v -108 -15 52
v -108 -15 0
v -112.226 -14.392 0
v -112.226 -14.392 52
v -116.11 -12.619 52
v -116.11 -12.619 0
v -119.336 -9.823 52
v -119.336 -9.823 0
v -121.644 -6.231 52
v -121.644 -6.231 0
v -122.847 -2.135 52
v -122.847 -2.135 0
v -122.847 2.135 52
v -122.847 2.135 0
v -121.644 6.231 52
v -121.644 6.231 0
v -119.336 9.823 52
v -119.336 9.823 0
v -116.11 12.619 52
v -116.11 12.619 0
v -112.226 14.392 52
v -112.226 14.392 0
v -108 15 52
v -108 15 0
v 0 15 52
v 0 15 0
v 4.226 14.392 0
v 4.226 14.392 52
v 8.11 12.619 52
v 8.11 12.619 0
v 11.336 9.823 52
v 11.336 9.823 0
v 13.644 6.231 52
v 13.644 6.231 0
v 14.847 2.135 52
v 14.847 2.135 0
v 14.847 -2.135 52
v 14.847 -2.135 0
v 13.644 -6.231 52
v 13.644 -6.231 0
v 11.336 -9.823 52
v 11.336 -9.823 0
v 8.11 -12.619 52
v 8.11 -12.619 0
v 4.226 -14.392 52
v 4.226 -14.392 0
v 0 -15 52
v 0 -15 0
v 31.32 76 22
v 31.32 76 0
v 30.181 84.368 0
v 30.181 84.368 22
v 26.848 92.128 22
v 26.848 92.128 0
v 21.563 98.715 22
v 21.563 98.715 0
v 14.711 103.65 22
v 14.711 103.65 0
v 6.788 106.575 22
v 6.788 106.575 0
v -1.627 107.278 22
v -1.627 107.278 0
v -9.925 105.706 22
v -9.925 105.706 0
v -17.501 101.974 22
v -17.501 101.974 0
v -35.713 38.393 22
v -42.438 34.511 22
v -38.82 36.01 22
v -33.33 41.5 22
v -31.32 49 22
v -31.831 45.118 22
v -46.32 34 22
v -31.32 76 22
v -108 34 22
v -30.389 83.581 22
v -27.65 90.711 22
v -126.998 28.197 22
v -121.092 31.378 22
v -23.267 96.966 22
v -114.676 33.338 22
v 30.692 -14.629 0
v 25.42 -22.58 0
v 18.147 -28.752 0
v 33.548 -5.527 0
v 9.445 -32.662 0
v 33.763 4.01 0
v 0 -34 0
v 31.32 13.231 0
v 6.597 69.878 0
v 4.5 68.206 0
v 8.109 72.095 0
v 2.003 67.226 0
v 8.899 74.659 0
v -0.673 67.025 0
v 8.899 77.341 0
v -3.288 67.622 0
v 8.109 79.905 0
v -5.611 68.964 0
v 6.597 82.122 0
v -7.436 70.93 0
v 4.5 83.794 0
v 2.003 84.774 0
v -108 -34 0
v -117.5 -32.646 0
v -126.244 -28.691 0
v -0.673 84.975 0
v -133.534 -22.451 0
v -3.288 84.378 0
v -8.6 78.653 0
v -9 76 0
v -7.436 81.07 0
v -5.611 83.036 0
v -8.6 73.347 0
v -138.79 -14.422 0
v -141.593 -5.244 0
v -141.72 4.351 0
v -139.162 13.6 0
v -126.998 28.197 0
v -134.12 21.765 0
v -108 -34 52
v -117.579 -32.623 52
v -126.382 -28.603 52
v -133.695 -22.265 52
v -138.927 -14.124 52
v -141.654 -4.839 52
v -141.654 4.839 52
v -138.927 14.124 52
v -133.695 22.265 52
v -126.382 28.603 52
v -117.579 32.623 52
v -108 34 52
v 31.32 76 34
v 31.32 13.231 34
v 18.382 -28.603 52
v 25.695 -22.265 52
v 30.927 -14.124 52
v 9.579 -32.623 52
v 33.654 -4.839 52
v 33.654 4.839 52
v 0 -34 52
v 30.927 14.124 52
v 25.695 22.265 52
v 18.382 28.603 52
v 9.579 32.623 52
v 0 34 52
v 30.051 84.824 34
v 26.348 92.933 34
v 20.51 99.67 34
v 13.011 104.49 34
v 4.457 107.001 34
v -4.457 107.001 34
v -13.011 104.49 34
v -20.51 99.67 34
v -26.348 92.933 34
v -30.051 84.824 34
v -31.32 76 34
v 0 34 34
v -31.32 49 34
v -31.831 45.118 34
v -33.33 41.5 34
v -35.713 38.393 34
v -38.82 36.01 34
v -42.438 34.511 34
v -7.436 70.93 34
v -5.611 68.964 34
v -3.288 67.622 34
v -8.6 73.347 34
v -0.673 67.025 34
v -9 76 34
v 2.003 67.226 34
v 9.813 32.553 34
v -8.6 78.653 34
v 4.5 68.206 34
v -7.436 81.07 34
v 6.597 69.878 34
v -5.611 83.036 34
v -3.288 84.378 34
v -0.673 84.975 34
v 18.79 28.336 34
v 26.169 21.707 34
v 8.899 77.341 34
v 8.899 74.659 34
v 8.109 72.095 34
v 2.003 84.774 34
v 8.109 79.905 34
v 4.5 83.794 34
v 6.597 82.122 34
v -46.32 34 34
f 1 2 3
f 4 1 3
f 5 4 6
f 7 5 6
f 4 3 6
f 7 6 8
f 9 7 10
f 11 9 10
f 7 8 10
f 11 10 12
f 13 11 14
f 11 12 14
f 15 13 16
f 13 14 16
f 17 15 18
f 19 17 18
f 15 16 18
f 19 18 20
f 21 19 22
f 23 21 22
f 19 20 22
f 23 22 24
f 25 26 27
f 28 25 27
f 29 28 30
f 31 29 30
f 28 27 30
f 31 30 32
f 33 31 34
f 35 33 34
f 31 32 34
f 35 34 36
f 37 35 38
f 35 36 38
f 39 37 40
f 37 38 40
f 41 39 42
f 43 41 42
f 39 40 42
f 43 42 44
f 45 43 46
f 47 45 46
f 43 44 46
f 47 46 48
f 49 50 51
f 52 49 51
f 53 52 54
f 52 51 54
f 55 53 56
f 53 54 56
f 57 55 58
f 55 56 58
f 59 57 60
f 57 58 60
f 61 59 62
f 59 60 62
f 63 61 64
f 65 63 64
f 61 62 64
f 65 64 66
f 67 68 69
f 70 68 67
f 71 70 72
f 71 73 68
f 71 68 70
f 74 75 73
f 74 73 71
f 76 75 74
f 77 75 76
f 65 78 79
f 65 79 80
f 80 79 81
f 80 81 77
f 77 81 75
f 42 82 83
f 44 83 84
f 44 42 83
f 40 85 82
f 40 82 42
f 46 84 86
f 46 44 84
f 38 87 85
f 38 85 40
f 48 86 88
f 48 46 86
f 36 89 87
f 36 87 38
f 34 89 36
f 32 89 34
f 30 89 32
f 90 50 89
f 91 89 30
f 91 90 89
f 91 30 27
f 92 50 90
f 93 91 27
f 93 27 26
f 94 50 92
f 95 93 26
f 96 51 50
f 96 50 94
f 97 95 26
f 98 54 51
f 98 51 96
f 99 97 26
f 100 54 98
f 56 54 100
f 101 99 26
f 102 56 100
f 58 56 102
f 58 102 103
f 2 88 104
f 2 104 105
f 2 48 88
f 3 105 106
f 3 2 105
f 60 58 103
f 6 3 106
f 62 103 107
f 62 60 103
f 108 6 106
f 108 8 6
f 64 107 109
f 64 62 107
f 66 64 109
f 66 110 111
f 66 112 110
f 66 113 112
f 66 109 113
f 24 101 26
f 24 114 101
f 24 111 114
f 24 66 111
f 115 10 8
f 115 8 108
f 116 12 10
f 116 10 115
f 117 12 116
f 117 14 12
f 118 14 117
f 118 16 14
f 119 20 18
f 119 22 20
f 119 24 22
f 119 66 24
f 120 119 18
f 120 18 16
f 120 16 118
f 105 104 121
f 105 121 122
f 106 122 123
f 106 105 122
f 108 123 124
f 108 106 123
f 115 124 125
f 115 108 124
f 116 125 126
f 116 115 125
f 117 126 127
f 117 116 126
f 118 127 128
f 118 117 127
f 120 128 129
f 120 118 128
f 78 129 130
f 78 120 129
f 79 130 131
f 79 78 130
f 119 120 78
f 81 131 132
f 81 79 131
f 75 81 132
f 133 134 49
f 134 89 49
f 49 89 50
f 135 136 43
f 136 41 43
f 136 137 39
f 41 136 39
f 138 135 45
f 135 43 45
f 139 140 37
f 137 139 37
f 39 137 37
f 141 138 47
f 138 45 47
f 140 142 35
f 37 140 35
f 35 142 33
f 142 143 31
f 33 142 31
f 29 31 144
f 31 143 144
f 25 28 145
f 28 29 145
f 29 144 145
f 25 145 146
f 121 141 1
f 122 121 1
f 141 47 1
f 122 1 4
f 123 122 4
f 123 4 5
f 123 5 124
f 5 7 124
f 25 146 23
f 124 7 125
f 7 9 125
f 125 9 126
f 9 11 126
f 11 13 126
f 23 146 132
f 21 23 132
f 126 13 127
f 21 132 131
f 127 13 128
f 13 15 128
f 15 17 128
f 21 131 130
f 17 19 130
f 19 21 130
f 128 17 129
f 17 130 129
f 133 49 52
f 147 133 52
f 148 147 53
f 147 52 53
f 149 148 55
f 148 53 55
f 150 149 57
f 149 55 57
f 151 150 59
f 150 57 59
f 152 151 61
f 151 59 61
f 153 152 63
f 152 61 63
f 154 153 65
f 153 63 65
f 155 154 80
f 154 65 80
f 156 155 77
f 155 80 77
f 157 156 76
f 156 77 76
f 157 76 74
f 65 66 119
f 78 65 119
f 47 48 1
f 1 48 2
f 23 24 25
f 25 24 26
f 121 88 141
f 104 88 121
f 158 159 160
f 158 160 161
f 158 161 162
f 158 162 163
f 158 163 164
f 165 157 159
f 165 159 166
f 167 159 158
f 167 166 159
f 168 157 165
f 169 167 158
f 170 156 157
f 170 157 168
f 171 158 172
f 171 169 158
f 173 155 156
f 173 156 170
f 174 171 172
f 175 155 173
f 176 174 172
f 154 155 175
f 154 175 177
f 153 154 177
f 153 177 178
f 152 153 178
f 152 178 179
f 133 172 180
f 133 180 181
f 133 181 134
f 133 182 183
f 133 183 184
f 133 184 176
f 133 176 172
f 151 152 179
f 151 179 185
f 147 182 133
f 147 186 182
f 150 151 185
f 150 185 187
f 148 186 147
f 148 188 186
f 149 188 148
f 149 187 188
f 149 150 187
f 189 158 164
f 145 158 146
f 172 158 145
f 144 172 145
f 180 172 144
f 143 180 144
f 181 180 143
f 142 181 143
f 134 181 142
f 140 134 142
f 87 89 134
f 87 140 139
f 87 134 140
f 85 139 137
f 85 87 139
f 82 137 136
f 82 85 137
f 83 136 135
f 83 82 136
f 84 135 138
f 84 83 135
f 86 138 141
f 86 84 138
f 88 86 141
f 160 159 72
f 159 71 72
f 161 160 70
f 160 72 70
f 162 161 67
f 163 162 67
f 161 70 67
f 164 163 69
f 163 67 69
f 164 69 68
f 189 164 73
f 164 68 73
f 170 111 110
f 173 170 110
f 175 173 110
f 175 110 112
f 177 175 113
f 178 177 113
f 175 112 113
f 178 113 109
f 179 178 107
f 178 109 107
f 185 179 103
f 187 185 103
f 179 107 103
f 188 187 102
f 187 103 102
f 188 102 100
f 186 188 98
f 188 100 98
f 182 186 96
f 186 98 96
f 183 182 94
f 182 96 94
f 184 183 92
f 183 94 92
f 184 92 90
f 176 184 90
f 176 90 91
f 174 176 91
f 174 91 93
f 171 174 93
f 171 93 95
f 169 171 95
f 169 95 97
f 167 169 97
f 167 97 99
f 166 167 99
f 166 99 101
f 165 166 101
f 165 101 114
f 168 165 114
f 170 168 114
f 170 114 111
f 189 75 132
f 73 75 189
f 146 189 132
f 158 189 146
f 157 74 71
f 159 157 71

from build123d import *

# Parameters (mm, degrees)
BOSS_EXTRUDE1_DEPTH             = 52
BOSS_EXTRUDE2_DEPTH             = 22
BOSS_EXTRUDE3_DEPTH             = 12
F_1_0MM_CLEARANCE_DOWEL_HOLE1_D = 18
FILLET1_R                       = 15


with BuildPart() as part:
    # Sketch1 → Boss-Extrude1 (new body)
    with BuildSketch(Plane.XY):
        with BuildLine():
            Line((0, -34), (-108, -34))
            ThreePointArc((-108, -34), (-142, 0), (-108, 34))
            Line((-108, 34), (0, 34))
            ThreePointArc((0, 34), (34, 0), (0, -34))
        make_face()
        with BuildLine():
            Line((0, -15), (-108, -15))
            ThreePointArc((-108, -15), (-123, 0), (-108, 15))
            Line((-108, 15), (0, 15))
            ThreePointArc((0, 15), (15, 0), (0, -15))
        make_face(mode=Mode.SUBTRACT)
    extrude(amount=BOSS_EXTRUDE1_DEPTH)

    # Sketch2 → Boss-Extrude2 (add)
    with BuildSketch(Plane.XY):
        with BuildLine():
            Line((-126.998451924, 28.196787485), (0, 28.196787485))
            Line((0, 28.196787485), (31.319910556, 13.231145179))
            Line((31.319910556, 13.231145179), (31.319910556, 76))
            ThreePointArc((31.319910556, 76), (14.710725641, 103.650160006), (-17.500876911, 101.974143))
            Line((-17.500876911, 101.974143), (-126.998451924, 28.196787485))
        make_face()
    extrude(amount=BOSS_EXTRUDE2_DEPTH)

    # Sketch3 → Boss-Extrude3 (add)
    with BuildSketch(Plane.XY.offset(22)):
        with BuildLine():
            Line((-31.319910556, 76), (-31.319910556, 27.253285183))
            Line((-31.319910556, 27.253285183), (31.319910556, 13.231145179))
            Line((31.319910556, 13.231145179), (31.319910556, 76))
            ThreePointArc((31.319910556, 76), (0, 107.319910556), (-31.319910556, 76))
        make_face()
    extrude(amount=BOSS_EXTRUDE3_DEPTH)

    # Ø1.0mm Clearance Dowel Hole1 (through all)
    with Locations(Plane.XY.offset(34)):
        with Locations((0, 76)):
            Hole(F_1_0MM_CLEARANCE_DOWEL_HOLE1_D / 2)

    # Fillet1
    fillet1_edges = [part.edges().sort_by_distance(p)[0] for p in [
        (-31.319910556, 34, 28),
    ]]
    fillet(fillet1_edges, radius=FILLET1_R)


solid = part.part
